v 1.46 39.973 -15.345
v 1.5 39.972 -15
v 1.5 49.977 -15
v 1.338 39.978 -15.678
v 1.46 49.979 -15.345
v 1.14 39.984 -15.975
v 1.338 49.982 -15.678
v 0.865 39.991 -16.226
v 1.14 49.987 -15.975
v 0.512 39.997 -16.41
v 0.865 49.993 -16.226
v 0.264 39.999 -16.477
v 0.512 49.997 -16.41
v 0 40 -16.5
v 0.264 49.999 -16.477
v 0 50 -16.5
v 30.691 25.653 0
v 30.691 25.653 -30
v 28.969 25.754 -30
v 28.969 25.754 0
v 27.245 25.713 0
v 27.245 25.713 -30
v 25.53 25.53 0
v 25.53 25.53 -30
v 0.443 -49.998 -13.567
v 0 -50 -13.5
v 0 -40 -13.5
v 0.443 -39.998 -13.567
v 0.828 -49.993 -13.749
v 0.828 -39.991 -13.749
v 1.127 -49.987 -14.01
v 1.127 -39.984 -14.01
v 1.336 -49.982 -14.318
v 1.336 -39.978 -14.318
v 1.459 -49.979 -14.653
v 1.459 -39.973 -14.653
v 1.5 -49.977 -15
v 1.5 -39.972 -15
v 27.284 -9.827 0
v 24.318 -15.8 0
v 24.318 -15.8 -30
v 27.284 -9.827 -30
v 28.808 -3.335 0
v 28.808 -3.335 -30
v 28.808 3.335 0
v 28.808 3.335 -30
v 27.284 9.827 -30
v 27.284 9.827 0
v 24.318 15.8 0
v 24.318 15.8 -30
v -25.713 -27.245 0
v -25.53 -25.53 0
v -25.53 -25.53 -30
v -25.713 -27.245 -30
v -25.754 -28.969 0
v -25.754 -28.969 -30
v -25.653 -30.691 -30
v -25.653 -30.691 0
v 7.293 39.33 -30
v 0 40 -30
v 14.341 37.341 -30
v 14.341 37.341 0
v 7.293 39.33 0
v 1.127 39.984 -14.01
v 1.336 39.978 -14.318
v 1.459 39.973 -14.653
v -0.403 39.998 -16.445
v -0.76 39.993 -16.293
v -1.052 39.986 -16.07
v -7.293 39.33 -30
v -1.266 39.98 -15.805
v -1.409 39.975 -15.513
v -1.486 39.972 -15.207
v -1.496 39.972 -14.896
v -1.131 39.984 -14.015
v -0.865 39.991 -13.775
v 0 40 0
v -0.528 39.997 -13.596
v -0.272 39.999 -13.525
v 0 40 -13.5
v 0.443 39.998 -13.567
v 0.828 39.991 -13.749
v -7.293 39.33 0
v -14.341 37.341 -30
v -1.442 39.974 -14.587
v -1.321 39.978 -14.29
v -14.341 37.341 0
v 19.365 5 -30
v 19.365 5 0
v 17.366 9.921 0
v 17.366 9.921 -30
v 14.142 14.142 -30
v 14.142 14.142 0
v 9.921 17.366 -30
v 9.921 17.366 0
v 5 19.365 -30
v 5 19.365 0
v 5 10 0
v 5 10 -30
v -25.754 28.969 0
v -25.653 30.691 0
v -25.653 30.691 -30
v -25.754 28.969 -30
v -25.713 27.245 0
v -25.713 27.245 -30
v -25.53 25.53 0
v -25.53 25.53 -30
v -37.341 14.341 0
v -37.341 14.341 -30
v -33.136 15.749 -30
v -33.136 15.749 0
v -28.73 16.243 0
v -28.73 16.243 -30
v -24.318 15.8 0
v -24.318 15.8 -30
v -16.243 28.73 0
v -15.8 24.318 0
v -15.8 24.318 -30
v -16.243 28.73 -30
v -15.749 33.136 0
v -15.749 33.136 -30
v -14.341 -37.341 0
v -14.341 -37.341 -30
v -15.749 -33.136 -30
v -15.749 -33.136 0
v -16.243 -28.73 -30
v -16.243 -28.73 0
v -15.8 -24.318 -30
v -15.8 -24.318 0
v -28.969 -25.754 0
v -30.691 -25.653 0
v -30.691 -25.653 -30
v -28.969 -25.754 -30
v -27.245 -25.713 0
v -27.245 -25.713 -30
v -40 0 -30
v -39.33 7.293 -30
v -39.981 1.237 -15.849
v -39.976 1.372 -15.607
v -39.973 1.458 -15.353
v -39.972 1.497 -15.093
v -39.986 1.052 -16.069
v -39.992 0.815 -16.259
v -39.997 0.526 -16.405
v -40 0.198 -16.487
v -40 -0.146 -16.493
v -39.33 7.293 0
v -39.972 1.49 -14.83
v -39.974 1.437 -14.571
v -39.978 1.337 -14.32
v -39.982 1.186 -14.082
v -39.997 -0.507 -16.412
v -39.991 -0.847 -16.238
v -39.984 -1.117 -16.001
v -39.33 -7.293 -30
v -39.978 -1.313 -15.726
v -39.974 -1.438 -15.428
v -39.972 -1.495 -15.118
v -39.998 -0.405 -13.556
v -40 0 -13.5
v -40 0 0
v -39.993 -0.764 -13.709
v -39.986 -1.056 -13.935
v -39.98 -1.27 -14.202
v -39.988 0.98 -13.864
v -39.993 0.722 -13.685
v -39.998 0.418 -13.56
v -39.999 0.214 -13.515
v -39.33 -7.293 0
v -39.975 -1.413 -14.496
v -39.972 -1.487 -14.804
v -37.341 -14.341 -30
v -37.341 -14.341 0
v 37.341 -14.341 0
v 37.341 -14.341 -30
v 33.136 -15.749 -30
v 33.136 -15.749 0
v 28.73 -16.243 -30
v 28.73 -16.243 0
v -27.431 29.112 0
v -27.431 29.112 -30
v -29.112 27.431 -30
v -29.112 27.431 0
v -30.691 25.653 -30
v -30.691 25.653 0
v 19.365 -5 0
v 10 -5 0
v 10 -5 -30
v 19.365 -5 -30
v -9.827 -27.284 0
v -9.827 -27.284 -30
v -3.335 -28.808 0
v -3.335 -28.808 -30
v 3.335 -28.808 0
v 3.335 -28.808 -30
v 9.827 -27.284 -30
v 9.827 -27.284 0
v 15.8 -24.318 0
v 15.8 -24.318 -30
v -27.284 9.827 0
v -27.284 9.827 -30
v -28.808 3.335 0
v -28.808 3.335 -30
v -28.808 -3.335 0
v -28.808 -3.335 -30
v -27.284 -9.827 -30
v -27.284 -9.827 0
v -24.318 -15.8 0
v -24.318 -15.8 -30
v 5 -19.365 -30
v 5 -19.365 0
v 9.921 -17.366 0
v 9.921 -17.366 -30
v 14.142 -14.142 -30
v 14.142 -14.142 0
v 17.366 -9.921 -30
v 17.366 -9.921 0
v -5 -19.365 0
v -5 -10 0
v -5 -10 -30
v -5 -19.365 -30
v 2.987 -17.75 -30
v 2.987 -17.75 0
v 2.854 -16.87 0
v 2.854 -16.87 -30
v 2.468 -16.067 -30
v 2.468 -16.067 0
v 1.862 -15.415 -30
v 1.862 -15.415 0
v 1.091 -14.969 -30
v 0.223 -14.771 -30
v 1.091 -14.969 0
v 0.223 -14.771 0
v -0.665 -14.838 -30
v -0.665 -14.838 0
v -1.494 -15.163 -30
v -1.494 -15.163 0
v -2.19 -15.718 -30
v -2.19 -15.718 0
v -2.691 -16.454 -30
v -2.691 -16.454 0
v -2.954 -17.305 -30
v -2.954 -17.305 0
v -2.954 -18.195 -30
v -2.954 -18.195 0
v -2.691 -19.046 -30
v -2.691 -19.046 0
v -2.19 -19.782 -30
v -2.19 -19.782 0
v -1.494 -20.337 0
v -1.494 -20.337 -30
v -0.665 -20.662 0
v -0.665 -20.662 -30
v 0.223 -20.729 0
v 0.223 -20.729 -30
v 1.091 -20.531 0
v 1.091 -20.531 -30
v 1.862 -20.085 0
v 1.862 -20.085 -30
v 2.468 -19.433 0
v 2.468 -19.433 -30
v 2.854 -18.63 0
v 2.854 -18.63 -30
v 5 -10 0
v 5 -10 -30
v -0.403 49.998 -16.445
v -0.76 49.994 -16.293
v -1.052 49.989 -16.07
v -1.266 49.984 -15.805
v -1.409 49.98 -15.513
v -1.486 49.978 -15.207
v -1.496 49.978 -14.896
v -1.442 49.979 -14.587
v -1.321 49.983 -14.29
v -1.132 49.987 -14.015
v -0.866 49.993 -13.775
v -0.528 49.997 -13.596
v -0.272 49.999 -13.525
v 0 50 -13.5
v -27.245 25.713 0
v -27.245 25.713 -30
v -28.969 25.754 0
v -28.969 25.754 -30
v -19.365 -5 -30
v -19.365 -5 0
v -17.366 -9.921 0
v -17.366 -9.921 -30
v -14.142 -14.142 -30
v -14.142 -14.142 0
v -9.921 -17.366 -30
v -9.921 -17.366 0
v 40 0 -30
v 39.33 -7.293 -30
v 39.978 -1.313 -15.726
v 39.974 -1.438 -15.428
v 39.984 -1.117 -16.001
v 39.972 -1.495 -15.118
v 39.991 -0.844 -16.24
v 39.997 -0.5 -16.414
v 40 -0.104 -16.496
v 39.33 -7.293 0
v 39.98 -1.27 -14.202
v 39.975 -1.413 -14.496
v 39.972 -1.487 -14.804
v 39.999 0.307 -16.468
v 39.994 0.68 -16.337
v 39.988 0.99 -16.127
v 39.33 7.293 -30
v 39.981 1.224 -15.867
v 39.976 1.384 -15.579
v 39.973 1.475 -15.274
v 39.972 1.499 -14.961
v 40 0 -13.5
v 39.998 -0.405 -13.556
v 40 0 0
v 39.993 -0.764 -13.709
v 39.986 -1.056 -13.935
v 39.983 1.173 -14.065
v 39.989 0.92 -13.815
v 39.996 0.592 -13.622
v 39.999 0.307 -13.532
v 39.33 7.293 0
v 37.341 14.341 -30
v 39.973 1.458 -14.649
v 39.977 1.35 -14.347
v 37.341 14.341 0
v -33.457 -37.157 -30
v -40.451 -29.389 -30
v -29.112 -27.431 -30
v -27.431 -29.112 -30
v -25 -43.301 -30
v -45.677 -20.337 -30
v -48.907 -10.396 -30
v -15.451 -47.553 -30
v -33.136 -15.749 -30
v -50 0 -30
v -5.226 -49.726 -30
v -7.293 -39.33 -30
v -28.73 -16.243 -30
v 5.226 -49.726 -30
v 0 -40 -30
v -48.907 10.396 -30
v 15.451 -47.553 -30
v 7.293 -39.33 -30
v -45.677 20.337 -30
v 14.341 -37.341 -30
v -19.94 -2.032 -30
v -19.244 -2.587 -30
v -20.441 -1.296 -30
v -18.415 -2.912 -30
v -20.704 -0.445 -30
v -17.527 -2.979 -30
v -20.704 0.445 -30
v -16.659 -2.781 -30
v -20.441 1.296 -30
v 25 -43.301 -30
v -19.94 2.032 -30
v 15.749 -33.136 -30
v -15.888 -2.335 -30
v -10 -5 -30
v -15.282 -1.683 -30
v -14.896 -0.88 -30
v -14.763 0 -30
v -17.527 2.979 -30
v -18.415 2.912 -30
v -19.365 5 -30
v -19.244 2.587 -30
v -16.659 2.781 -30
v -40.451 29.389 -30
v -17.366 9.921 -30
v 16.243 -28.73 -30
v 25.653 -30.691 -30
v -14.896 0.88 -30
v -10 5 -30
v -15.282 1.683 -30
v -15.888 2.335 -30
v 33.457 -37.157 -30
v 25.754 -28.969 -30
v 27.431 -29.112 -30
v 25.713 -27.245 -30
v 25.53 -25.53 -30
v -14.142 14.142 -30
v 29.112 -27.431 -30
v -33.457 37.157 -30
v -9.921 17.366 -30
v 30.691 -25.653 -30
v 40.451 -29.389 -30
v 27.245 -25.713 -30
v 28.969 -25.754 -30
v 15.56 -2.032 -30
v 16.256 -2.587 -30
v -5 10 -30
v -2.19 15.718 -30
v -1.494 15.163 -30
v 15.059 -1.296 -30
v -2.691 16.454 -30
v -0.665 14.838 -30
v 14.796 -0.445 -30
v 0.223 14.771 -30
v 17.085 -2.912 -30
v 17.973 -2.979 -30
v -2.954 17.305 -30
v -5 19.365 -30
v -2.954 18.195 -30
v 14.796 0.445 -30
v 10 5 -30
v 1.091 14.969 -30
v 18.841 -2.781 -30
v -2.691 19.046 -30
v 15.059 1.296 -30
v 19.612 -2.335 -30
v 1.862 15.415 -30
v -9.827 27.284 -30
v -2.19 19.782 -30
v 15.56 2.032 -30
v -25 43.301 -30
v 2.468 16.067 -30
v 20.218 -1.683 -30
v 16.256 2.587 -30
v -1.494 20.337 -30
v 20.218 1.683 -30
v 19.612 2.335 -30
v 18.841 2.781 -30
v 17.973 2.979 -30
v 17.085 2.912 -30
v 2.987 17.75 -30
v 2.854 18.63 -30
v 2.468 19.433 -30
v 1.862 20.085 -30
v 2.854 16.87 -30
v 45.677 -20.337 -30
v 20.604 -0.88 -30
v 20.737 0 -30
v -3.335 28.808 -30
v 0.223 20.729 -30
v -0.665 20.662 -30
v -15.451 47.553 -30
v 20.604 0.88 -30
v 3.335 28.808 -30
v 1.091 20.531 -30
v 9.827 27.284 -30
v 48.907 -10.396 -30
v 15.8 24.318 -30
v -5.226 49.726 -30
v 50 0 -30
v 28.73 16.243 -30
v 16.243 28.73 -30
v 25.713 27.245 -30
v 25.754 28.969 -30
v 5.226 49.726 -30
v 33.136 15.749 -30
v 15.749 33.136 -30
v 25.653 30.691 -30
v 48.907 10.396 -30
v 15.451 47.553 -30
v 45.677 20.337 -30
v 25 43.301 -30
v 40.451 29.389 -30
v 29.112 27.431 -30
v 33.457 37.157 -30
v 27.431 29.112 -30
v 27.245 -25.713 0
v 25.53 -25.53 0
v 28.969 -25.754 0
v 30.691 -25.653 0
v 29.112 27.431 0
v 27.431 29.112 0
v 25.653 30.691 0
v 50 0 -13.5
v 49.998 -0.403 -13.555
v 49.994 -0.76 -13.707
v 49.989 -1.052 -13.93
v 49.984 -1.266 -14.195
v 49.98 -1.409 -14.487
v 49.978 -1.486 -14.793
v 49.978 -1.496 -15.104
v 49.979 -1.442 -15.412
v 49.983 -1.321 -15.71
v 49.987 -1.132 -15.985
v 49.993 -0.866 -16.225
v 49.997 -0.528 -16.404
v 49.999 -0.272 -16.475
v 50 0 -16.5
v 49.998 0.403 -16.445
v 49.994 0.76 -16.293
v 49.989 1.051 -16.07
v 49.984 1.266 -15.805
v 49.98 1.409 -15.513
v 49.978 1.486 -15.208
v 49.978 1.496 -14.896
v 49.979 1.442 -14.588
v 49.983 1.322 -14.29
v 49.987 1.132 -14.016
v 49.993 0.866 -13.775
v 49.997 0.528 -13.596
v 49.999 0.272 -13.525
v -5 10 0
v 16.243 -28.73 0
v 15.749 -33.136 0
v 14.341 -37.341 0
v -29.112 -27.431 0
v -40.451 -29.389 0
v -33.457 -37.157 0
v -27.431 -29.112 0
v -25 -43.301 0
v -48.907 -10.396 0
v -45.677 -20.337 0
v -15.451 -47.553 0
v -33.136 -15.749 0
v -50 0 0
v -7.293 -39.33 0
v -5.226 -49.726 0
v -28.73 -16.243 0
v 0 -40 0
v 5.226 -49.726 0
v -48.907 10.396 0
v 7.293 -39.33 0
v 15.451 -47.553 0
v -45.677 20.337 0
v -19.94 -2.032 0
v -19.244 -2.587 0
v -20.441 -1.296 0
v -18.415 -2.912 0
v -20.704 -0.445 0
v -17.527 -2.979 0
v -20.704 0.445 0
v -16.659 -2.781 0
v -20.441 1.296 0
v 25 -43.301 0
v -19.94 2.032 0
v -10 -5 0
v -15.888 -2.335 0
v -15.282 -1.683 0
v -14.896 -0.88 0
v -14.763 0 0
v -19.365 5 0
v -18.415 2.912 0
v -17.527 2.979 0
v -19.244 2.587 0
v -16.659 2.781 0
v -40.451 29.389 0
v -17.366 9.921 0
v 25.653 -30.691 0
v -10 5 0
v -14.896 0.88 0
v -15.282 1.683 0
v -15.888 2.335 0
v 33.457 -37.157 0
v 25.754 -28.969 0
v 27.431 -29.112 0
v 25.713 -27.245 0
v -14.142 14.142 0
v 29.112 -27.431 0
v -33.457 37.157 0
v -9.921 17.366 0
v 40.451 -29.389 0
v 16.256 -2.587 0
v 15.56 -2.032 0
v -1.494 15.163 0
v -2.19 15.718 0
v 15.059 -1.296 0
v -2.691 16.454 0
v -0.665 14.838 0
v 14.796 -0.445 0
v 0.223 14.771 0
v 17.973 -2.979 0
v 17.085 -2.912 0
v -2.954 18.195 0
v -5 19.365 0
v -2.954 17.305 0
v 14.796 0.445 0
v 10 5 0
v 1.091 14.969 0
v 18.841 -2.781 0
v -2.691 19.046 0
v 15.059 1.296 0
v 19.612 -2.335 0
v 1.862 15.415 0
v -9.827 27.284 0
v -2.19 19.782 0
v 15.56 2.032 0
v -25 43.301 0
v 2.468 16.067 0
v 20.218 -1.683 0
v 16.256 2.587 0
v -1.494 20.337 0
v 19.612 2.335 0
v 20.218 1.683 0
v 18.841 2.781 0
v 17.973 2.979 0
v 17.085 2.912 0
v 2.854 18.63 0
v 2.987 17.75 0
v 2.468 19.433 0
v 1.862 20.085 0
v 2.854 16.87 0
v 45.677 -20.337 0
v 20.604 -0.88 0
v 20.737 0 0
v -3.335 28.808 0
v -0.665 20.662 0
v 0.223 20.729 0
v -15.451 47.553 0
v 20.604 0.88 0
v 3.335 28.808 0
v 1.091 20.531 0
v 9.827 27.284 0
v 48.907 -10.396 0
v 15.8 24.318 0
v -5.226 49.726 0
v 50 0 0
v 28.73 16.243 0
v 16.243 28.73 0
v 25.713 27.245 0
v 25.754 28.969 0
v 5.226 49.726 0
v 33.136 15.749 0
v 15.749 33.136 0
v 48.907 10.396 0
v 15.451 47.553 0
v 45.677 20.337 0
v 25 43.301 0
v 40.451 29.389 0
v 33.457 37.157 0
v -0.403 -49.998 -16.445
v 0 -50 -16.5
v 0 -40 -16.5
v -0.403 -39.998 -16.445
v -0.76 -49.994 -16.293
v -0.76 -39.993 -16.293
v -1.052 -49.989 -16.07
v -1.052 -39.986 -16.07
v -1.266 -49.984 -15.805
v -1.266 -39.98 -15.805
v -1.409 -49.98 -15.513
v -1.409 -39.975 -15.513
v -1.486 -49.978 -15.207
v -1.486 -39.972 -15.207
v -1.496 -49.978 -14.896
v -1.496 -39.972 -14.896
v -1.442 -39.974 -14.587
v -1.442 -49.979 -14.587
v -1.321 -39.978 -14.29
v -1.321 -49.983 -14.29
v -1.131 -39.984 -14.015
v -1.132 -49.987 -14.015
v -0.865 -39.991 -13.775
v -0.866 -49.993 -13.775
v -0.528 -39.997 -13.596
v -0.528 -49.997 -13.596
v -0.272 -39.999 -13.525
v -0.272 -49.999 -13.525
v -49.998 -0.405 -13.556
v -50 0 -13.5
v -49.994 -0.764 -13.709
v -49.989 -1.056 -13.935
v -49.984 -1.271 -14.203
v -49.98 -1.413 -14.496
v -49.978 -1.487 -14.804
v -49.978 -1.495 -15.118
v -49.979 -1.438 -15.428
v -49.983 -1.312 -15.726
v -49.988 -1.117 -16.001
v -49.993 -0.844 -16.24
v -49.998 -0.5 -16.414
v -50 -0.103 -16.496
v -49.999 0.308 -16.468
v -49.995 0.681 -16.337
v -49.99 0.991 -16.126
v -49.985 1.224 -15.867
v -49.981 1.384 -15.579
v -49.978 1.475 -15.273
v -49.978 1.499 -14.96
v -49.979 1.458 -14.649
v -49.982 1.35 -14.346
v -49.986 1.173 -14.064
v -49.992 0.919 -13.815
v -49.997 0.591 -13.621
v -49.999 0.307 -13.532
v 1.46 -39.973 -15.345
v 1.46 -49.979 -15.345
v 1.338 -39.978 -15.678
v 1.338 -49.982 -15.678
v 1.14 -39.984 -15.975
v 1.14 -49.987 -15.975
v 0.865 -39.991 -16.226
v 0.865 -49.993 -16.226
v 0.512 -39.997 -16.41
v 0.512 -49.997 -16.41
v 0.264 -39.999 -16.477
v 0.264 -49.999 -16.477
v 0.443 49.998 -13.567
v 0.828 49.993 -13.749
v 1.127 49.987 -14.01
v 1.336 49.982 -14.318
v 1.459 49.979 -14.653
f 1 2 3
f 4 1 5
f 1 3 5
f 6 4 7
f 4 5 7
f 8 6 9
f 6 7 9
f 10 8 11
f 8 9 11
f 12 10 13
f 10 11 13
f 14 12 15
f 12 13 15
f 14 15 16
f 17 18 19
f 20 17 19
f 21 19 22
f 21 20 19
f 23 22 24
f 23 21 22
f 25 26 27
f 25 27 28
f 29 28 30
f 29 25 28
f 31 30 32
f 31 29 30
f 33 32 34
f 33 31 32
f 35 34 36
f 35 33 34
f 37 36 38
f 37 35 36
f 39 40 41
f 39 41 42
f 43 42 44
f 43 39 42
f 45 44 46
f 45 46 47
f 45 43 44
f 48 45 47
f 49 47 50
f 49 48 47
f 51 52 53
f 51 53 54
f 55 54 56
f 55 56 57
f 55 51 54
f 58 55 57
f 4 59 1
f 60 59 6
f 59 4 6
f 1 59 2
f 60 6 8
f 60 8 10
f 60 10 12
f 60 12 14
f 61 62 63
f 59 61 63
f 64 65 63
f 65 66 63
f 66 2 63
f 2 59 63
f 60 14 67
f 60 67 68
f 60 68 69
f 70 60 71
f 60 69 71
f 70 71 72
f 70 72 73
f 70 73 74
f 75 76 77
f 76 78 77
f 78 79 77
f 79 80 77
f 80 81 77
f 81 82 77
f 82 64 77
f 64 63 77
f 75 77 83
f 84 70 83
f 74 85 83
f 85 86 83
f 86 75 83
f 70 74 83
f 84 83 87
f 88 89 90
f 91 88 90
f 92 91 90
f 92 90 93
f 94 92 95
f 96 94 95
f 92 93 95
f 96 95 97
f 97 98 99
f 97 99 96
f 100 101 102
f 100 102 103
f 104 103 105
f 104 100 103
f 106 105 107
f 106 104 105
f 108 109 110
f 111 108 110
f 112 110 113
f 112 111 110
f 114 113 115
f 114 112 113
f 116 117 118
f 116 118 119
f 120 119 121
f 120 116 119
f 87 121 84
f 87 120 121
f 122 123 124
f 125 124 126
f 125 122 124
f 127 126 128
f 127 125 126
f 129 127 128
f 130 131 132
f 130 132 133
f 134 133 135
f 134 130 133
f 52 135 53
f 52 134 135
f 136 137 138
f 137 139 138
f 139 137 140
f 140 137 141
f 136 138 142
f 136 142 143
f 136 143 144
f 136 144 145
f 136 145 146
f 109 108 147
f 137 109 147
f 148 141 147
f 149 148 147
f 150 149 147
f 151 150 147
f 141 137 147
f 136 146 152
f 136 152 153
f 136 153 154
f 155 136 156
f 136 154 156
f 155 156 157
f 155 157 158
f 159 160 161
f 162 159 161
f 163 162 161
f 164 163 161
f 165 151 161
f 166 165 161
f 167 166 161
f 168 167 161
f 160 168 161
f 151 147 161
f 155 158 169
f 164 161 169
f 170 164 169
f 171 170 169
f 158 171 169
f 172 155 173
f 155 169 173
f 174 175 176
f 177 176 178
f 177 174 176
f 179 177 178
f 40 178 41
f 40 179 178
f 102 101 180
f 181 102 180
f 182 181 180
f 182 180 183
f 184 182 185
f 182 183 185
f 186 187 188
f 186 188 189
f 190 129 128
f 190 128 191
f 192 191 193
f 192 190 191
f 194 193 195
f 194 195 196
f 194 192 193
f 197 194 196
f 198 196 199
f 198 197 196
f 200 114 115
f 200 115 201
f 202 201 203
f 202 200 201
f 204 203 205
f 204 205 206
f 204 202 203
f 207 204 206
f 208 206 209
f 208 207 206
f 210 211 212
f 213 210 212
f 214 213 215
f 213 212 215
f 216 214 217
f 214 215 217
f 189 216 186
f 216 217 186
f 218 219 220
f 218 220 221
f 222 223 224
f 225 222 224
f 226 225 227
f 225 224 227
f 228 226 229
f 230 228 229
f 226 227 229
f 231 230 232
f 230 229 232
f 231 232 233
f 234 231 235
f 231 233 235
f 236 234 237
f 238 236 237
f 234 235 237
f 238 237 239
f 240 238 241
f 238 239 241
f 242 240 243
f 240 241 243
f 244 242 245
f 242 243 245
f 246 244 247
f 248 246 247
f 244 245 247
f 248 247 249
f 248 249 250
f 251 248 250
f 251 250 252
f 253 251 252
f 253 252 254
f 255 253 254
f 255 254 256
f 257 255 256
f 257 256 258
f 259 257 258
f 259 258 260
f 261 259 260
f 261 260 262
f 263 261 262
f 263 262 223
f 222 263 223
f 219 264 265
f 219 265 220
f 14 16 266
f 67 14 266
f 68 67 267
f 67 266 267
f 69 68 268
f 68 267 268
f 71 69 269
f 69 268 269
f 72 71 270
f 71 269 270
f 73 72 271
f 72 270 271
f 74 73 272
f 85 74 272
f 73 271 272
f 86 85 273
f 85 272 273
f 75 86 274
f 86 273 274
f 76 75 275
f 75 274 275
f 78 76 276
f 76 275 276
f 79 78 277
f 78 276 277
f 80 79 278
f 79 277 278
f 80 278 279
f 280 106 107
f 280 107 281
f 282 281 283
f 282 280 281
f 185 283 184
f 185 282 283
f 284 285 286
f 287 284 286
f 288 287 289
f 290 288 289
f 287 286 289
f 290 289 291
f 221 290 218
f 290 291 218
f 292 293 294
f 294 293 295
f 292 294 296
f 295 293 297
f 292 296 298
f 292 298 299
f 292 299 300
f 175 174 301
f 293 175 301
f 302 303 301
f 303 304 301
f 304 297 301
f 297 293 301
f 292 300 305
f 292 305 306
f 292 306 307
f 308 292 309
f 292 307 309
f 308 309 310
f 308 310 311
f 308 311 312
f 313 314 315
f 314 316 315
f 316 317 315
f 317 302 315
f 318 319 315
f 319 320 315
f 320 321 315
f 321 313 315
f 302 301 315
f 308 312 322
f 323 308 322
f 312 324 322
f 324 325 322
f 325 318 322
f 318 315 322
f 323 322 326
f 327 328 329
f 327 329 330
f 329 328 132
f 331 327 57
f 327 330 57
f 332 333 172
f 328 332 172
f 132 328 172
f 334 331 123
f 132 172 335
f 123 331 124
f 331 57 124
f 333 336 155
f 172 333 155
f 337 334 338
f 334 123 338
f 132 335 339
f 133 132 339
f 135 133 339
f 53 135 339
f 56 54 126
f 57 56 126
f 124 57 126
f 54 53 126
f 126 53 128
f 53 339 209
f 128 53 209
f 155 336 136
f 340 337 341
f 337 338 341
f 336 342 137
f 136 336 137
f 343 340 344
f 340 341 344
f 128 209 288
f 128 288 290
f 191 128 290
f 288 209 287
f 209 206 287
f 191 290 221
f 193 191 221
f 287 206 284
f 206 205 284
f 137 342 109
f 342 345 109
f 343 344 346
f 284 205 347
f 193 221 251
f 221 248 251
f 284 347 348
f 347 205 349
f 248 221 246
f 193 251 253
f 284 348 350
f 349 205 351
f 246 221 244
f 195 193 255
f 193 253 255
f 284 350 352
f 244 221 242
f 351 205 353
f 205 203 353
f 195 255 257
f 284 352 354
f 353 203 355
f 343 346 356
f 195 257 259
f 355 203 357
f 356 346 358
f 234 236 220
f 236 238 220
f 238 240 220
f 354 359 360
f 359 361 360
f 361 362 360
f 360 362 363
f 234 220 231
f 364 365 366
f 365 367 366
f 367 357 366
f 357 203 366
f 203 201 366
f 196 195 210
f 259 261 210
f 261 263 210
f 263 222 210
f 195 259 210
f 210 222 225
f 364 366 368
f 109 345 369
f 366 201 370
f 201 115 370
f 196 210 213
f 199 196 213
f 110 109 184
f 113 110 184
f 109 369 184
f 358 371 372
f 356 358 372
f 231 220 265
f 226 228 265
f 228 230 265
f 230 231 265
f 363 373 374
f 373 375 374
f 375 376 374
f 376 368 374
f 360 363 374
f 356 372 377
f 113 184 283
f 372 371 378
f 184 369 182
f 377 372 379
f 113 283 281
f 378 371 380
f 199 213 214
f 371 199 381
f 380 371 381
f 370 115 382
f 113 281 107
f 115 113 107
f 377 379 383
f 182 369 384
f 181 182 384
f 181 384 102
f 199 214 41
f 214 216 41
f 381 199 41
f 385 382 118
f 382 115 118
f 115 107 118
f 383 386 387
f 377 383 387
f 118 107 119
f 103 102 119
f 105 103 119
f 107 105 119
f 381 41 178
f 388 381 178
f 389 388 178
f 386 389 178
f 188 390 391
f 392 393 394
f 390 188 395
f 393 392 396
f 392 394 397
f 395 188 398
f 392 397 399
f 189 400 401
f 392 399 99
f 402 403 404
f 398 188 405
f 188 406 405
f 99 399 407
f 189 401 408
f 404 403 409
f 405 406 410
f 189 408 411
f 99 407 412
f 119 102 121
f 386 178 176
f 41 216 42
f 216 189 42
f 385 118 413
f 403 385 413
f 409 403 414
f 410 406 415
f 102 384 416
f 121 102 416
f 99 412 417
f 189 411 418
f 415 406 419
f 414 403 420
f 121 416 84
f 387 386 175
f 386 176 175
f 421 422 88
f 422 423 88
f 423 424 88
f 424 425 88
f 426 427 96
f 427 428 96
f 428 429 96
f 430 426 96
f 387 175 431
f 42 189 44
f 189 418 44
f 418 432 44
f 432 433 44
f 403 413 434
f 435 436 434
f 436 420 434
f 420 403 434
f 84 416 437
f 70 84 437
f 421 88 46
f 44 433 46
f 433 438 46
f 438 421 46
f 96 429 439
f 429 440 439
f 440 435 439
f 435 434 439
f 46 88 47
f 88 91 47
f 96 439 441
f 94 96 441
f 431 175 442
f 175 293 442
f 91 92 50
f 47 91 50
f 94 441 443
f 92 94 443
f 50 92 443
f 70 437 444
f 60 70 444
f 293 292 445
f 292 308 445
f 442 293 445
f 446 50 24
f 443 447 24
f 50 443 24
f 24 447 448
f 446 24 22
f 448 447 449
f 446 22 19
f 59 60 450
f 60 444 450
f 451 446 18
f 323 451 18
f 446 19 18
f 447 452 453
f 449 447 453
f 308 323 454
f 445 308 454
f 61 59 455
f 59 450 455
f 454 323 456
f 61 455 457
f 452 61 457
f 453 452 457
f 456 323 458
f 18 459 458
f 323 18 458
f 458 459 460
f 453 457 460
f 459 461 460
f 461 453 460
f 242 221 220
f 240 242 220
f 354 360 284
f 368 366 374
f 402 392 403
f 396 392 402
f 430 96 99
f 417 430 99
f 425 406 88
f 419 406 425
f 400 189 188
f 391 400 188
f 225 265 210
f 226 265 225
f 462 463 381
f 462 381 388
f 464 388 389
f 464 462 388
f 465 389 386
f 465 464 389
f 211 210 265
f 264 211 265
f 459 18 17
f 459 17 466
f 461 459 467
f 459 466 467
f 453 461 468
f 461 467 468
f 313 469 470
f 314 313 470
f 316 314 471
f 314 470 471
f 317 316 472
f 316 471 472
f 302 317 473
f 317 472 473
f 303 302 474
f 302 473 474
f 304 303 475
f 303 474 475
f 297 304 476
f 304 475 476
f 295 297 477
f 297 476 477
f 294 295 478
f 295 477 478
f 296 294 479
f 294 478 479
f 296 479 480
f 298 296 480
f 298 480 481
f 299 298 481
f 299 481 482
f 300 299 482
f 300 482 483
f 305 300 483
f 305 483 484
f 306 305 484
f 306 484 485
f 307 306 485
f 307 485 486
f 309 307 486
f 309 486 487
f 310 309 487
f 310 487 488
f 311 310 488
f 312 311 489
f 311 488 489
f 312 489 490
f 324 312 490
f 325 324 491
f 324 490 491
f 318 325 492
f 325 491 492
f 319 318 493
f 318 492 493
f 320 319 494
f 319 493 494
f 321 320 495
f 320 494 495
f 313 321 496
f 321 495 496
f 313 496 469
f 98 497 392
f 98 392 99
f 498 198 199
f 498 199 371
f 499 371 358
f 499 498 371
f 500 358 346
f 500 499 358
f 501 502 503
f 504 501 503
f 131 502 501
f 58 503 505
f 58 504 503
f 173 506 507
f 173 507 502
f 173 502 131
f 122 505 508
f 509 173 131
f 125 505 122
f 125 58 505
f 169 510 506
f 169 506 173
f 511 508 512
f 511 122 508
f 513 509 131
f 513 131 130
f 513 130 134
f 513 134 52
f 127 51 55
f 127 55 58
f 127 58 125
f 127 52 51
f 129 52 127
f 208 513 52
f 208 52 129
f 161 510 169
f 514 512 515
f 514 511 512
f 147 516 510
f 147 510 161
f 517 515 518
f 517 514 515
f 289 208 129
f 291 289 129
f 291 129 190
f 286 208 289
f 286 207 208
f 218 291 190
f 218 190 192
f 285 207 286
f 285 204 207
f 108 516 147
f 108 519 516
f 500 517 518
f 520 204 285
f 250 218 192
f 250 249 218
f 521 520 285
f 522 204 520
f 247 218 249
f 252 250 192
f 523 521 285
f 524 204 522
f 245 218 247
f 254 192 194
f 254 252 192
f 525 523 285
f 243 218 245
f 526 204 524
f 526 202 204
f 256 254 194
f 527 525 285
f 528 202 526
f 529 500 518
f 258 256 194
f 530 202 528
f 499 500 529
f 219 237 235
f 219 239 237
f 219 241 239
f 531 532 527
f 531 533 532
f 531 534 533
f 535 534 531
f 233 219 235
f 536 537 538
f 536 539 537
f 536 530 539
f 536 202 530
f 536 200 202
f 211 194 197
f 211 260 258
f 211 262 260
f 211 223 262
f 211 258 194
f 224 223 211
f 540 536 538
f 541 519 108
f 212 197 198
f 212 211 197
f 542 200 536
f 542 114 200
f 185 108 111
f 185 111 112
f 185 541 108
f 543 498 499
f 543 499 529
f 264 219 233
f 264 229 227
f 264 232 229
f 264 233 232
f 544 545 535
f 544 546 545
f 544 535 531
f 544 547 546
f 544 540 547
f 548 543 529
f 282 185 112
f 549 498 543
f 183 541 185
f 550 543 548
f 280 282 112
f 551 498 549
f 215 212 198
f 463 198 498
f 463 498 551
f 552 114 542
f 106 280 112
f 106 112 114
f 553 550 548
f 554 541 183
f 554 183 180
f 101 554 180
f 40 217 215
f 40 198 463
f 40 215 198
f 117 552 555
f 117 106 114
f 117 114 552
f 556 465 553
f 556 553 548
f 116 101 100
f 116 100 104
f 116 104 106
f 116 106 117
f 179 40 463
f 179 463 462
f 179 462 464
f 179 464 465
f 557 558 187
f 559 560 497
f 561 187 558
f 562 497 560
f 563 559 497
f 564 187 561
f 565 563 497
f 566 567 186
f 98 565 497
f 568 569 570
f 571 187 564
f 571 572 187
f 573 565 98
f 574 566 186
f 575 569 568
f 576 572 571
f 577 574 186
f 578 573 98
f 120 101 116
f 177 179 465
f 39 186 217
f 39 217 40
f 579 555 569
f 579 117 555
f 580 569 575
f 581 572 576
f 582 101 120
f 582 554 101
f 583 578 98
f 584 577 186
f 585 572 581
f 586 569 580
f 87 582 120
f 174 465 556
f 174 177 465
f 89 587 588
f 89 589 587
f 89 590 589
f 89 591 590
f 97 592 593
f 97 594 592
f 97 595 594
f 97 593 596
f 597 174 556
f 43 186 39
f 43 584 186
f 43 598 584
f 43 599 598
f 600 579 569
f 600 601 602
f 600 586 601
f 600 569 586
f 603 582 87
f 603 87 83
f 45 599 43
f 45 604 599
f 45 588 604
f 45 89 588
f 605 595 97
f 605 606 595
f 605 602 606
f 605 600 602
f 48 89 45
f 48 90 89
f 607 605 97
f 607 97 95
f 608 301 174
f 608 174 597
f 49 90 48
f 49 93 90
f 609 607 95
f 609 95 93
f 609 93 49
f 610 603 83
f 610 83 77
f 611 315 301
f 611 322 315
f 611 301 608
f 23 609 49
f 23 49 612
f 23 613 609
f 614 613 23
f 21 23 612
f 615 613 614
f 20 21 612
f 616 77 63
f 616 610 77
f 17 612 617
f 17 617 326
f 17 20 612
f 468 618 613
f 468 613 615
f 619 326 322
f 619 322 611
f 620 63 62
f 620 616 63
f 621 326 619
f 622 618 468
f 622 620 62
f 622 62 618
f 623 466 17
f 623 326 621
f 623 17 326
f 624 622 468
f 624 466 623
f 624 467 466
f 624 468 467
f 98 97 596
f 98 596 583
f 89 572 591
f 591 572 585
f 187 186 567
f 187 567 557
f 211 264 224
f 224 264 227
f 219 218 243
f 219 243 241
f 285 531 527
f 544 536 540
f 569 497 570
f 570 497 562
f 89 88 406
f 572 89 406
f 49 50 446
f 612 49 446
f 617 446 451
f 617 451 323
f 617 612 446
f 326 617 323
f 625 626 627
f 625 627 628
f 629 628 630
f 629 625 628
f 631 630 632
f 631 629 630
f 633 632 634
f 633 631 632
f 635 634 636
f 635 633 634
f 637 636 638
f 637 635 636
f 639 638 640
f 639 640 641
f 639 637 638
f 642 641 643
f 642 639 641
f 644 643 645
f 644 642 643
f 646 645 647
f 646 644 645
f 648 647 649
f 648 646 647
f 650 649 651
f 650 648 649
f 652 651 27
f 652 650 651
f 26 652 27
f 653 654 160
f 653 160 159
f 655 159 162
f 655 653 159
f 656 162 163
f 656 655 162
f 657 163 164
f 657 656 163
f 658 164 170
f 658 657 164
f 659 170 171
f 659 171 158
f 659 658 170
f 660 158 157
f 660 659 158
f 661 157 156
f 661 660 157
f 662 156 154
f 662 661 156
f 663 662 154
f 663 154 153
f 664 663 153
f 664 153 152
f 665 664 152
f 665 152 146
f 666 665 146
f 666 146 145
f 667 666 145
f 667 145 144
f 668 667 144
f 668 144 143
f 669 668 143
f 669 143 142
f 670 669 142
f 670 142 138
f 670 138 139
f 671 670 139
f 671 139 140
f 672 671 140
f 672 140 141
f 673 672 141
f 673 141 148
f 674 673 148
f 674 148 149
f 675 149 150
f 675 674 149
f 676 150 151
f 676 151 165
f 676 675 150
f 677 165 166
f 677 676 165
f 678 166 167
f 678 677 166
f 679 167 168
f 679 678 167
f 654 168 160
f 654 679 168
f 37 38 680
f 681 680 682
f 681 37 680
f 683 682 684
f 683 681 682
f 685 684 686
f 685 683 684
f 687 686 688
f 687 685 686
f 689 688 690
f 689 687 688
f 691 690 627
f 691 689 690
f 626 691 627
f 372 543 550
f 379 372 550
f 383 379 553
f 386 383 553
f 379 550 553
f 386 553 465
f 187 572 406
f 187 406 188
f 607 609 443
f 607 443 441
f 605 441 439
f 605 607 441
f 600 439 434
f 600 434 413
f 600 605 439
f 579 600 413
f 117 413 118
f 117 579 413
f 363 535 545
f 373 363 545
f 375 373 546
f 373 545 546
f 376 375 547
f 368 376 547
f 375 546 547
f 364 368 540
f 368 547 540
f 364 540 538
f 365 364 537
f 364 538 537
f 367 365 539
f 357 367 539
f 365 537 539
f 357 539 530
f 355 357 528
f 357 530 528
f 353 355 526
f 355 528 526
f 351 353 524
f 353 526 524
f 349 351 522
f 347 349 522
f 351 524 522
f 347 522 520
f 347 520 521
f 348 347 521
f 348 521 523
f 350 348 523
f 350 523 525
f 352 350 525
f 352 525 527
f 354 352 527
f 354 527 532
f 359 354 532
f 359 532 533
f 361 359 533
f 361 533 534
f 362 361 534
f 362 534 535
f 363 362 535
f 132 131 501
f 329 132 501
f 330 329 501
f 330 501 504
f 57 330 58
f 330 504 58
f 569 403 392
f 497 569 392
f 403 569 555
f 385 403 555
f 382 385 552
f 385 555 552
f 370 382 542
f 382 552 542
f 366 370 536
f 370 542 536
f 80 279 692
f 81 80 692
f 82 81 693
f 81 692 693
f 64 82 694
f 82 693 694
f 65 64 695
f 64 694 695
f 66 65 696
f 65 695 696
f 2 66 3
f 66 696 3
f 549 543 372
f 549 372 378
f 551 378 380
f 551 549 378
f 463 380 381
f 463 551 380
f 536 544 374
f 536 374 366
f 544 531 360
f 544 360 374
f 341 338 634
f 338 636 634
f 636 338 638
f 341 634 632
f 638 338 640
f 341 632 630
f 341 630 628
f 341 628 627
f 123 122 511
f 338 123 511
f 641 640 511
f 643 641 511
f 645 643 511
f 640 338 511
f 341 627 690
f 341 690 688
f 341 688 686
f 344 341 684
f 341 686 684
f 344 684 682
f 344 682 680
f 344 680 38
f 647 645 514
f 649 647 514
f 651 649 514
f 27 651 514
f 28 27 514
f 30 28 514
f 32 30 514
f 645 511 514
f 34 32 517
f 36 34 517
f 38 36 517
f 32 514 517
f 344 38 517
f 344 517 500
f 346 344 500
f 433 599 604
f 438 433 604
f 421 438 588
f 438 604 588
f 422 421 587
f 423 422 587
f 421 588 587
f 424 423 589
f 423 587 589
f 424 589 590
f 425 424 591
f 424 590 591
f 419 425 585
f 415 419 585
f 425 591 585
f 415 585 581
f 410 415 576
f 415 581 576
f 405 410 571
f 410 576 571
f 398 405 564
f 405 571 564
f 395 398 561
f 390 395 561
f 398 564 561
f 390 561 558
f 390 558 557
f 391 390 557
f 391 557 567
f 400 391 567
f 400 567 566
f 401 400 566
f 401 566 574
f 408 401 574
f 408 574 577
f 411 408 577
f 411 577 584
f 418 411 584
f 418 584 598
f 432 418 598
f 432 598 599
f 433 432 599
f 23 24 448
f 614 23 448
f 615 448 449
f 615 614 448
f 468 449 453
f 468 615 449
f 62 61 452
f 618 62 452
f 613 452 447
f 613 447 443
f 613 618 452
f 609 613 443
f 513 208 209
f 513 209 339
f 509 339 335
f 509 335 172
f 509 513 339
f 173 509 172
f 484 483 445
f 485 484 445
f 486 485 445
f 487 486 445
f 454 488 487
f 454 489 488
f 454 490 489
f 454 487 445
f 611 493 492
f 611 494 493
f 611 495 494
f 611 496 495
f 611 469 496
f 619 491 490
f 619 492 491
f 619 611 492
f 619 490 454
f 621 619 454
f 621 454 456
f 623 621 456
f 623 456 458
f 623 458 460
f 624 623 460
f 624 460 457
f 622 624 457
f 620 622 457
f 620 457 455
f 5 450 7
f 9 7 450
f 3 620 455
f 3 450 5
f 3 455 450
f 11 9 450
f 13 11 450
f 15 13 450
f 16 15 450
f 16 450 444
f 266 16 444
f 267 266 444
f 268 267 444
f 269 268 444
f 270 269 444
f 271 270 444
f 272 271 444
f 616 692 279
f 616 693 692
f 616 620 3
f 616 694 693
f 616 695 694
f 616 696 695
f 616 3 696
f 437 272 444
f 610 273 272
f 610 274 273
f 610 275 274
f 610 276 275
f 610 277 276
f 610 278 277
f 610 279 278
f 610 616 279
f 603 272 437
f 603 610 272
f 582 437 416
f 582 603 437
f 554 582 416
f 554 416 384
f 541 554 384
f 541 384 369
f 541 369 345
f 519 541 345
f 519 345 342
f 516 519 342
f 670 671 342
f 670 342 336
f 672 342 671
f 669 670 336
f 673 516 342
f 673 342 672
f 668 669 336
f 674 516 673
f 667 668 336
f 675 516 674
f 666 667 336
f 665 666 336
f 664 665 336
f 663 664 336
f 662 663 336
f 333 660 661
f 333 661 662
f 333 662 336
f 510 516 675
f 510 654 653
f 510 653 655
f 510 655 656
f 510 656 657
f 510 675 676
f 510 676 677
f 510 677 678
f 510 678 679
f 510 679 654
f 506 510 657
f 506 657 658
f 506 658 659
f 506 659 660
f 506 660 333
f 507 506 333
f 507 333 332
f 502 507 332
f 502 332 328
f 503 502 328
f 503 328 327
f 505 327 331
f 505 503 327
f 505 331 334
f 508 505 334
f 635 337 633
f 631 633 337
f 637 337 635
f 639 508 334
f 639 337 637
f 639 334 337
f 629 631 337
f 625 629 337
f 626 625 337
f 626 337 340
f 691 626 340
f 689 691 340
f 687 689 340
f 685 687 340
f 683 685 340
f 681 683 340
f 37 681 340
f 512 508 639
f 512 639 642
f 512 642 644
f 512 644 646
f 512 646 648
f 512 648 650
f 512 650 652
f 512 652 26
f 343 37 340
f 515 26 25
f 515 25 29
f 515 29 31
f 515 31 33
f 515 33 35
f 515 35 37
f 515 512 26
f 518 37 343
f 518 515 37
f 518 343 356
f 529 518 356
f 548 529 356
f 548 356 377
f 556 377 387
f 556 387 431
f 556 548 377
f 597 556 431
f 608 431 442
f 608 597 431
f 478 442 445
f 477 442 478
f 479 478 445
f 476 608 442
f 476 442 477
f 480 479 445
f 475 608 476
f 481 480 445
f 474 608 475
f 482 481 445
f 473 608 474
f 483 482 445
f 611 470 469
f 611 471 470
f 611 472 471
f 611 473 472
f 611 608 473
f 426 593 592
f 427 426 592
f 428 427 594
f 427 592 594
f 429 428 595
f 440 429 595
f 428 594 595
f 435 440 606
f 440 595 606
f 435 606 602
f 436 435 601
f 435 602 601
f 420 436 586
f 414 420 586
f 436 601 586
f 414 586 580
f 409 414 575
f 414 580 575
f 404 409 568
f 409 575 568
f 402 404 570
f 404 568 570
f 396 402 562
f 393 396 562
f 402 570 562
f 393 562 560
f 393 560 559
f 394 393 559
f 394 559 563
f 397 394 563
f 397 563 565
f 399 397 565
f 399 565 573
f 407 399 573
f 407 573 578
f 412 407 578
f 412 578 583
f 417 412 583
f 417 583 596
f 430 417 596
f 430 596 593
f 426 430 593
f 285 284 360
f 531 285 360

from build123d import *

# Parameters (mm, degrees)
SKETCH6_R                        = 29
SKETCH6_R_2                      = 20
INNER_RING_DEPTH                 = 30
MOTOR_CONNECTOR_CUT_DEPTH        = 30
SKETCH9_R                        = 50
SKETCH9_R_2                      = 29
OUTSIDE_RING_EXTRUSION_DEPTH     = 30
SKETCH12_R                       = 45
SKETCH12_R_2                     = 27.5
CUT_EXTRUDE6_DEPTH               = 38
CUT_EXTRUDE6_DEPTH_BACK          = 56
SKETCH8_R                        = 2.987
MOTOR_CONNECTOR_HOLES_DEPTH      = 27
MOTOR_CONNECTOR_HOLES_DEPTH_BACK = 41
SKETCH10_R                       = 27.404299948
PATTERN_DEPTH                    = 30
SKETCH13_R                       = 45
SKETCH13_R_2                     = 40
BOSS_EXTRUDE1_DEPTH              = 30
CUT_EXTRUDE7_DEPTH               = 13
CUT_EXTRUDE8_DEPTH               = 15
CUT_EXTRUDE9_DEPTH               = 17
CUT_EXTRUDE10_DEPTH              = 17


with BuildPart() as part:
    # Sketch6 → Inner Ring (new body)
    with BuildSketch(Plane.XY):
        Circle(SKETCH6_R)
        Circle(SKETCH6_R_2, mode=Mode.SUBTRACT)
    extrude(amount=-INNER_RING_DEPTH)

    # Sketch7 → Motor Connector Cut (add)
    with BuildSketch(Plane.XY):
        with BuildLine():
            ThreePointArc((20, 0), (19.840593925, 2.52008585), (19.364916731, 5))
            Line((19.364916731, 5), (9.999996731, 5))
            Line((9.999996731, 5), (9.999996731, -5))
            Line((9.999996731, -5), (19.364916731, -5))
            ThreePointArc((19.364916731, -5), (19.840593925, -2.52008585), (20, 0))
        make_face()
        with BuildLine():
            ThreePointArc((5, 19.364916731), (0, 20), (-5, 19.364916731))
            Line((-5, 19.364916731), (-5, 9.999996731))
            Line((-5, 9.999996731), (5, 9.999996731))
            Line((5, 9.999996731), (5, 19.364916731))
        make_face()
        with BuildLine():
            Line((-9.999996731, -5), (-9.999996731, 5))
            Line((-9.999996731, 5), (-19.364916731, 5))
            ThreePointArc((-19.364916731, 5), (-20, 0), (-19.364916731, -5))
            Line((-19.364916731, -5), (-9.999996731, -5))
        make_face()
        with BuildLine():
            Line((-5, -9.999996731), (-5, -19.364916731))
            ThreePointArc((-5, -19.364916731), (0, -20), (5, -19.364916731))
            Line((5, -19.364916731), (5, -9.999996731))
            Line((5, -9.999996731), (-5, -9.999996731))
        make_face()
    extrude(amount=-MOTOR_CONNECTOR_CUT_DEPTH)

    # Sketch9 → Outside Ring Extrusion (add)
    with BuildSketch(Plane.XY):
        Circle(SKETCH9_R)
        Circle(SKETCH9_R_2, mode=Mode.SUBTRACT)
    extrude(amount=-OUTSIDE_RING_EXTRUSION_DEPTH)

    # Sketch12 → Cut-Extrude6 (cut, two sides)
    with BuildSketch(Plane.XY) as cut_extrude6_sk:
        Circle(SKETCH12_R)
        Circle(SKETCH12_R_2, mode=Mode.SUBTRACT)
    extrude(amount=CUT_EXTRUDE6_DEPTH, mode=Mode.SUBTRACT)
    extrude(cut_extrude6_sk.sketch, amount=-CUT_EXTRUDE6_DEPTH_BACK, mode=Mode.SUBTRACT)

    # Sketch8 → Motor Connector Holes (cut, two sides)
    with BuildSketch(Plane.XY) as motor_connector_holes_sk:
        with Locations((0, 17.75)):
            Circle(SKETCH8_R)
        with Locations((17.75, 0)):
            Circle(SKETCH8_R)
        with Locations((0, -17.75)):
            Circle(SKETCH8_R)
        with Locations((-17.75, 0)):
            Circle(SKETCH8_R)
    extrude(amount=MOTOR_CONNECTOR_HOLES_DEPTH, mode=Mode.SUBTRACT)
    extrude(motor_connector_holes_sk.sketch, amount=-MOTOR_CONNECTOR_HOLES_DEPTH_BACK, mode=Mode.SUBTRACT)

    # Sketch10 → Pattern (add)
    with BuildSketch(Plane.XY):
        with BuildLine():
            ThreePointArc((24.317625284, 15.800414568), (34.856582319, 15.291767932), (43.817916626, 9.721954269))
            ThreePointArc((43.817916626, 9.721954269), (41.607188912, 16.793289988), (38.263814419, 23.404867172))
            ThreePointArc((38.263814419, 23.404867172), (32.064348025, 25.470287935), (25.530148518, 25.530148518))
            ThreePointArc((25.530148518, 25.530148518), (25.475284033, 32.034279432), (23.432821057, 38.209639668))
            ThreePointArc((23.432821057, 38.209639668), (20.212556871, 40.002288656), (16.856128399, 41.524812789))
            ThreePointArc((16.856128399, 41.524812789), (13.384732217, 42.767397097), (9.823095744, 43.720997037))
            ThreePointArc((9.823095744, 43.720997037), (15.312499865, 34.789679765), (15.800414568, 24.317625284))
            ThreePointArc((15.800414568, 24.317625284), (0, 29), (-15.800414568, 24.317625284))
            ThreePointArc((-15.800414568, 24.317625284), (-15.312499865, 34.789679765), (-9.823095744, 43.720997037))
            ThreePointArc((-9.823095744, 43.720997037), (-16.854754984, 41.52536899), (-23.432821057, 38.209639668))
            ThreePointArc((-23.432821057, 38.209639668), (-25.475284033, 32.034279432), (-25.530148518, 25.530148518))
            ThreePointArc((-25.530148518, 25.530148518), (-32.064348025, 25.470287935), (-38.263814419, 23.404867172))
            ThreePointArc((-38.263814419, 23.404867172), (-41.607188912, 16.793289988), (-43.817916626, 9.721954269))
            ThreePointArc((-43.817916626, 9.721954269), (-34.856582319, 15.291767932), (-24.317625284, 15.800414568))
            ThreePointArc((-24.317625284, 15.800414568), (-29, 0), (-24.317625284, -15.800414568))
            ThreePointArc((-24.317625284, -15.800414568), (-34.894848495, -15.279799844), (-43.87309253, -9.663767027))
            ThreePointArc((-43.87309253, -9.663767027), (-41.716263612, -16.713446711), (-38.435015504, -23.315212041))
            ThreePointArc((-38.435015504, -23.315212041), (-32.159621016, -25.454161245), (-25.530148518, -25.530148518))
            ThreePointArc((-25.530148518, -25.530148518), (-25.448803812, -32.190695038), (-23.285614603, -38.490703716))
            ThreePointArc((-23.285614603, -38.490703716), (-16.649731385, -41.799208281), (-9.559859326, -43.970581744))
            ThreePointArc((-9.559859326, -43.970581744), (-15.258354287, -34.962784804), (-15.800414568, -24.317625284))
            ThreePointArc((-15.800414568, -24.317625284), (0, -29), (15.800414568, -24.317625284))
            ThreePointArc((15.800414568, -24.317625284), (15.258354287, -34.962784804), (9.559859326, -43.970581744))
            ThreePointArc((9.559859326, -43.970581744), (16.649731385, -41.799208281), (23.285614603, -38.490703716))
            ThreePointArc((23.285614603, -38.490703716), (25.448803812, -32.190695038), (25.530148518, -25.530148518))
            ThreePointArc((25.530148518, -25.530148518), (32.159621016, -25.454161245), (38.435015504, -23.315212041))
            ThreePointArc((38.435015504, -23.315212041), (41.716263612, -16.713446711), (43.87309253, -9.663767027))
            ThreePointArc((43.87309253, -9.663767027), (34.894848495, -15.279799844), (24.317625284, -15.800414568))
            ThreePointArc((24.317625284, -15.800414568), (29, 0), (24.317625284, 15.800414568))
        make_face()
        with Locations((-0.095700052, 0)):
            Circle(SKETCH10_R, mode=Mode.SUBTRACT)
    extrude(amount=-PATTERN_DEPTH)

    # Sketch13 → Boss-Extrude1 (add)
    with BuildSketch(Plane.XY):
        Circle(SKETCH13_R)
        Circle(SKETCH13_R_2, mode=Mode.SUBTRACT)
    extrude(amount=-BOSS_EXTRUDE1_DEPTH)

    # Sketch14 → Cut-Extrude7 (cut)
    with BuildSketch(Plane(origin=(0, 50, 0), x_dir=(1, 0, 0), z_dir=(0, 1, 0))):
        with BuildLine():
            ThreePointArc((0, 16.5), (-1.5, 15), (0, 13.5))
            Line((0, 13.5), (0, 16.5))
        make_face()
        with BuildLine():
            Line((0, 16.5), (0, 13.5))
            ThreePointArc((0, 13.5), (1.060660172, 13.939339828), (1.5, 15))
            ThreePointArc((1.5, 15), (1.060660172, 16.060660172), (0, 16.5))
        make_face()
    extrude(amount=-CUT_EXTRUDE7_DEPTH, mode=Mode.SUBTRACT)

    # Sketch15 → Cut-Extrude8 (cut)
    with BuildSketch(Plane(origin=(0, -50, 0), x_dir=(1, 0, 0), z_dir=(0, 1, 0))):
        with BuildLine():
            ThreePointArc((0, 16.5), (-1.5, 15), (0, 13.5))
            Line((0, 13.5), (0, 16.5))
        make_face()
        with BuildLine():
            Line((0, 16.5), (0, 13.5))
            ThreePointArc((0, 13.5), (1.060660172, 13.939339828), (1.5, 15))
            ThreePointArc((1.5, 15), (1.060660172, 16.060660172), (0, 16.5))
        make_face()
    extrude(amount=CUT_EXTRUDE8_DEPTH, mode=Mode.SUBTRACT)

    # Sketch16 → Cut-Extrude9 (cut)
    with BuildSketch(Plane(origin=(-50, 0, 0), x_dir=(0, 0, -1), z_dir=(1, 0, 0))):
        with BuildLine():
            ThreePointArc((16.5, 0), (15, 1.5), (13.5, 0))
            Line((13.5, 0), (16.5, 0))
        make_face()
        with BuildLine():
            Line((16.5, 0), (13.5, 0))
            ThreePointArc((13.5, 0), (15, -1.5), (16.5, 0))
        make_face()
    extrude(amount=CUT_EXTRUDE9_DEPTH, mode=Mode.SUBTRACT)

    # Sketch17 → Cut-Extrude10 (cut)
    with BuildSketch(Plane(origin=(50, 0, 0), x_dir=(0, 0, -1), z_dir=(1, 0, 0))):
        with BuildLine():
            ThreePointArc((16.5, 0), (15, 1.5), (13.5, 0))
            Line((13.5, 0), (16.5, 0))
        make_face()
        with BuildLine():
            Line((16.5, 0), (13.5, 0))
            ThreePointArc((13.5, 0), (15, -1.5), (16.5, 0))
        make_face()
    extrude(amount=-CUT_EXTRUDE10_DEPTH, mode=Mode.SUBTRACT)


solid = part.part
